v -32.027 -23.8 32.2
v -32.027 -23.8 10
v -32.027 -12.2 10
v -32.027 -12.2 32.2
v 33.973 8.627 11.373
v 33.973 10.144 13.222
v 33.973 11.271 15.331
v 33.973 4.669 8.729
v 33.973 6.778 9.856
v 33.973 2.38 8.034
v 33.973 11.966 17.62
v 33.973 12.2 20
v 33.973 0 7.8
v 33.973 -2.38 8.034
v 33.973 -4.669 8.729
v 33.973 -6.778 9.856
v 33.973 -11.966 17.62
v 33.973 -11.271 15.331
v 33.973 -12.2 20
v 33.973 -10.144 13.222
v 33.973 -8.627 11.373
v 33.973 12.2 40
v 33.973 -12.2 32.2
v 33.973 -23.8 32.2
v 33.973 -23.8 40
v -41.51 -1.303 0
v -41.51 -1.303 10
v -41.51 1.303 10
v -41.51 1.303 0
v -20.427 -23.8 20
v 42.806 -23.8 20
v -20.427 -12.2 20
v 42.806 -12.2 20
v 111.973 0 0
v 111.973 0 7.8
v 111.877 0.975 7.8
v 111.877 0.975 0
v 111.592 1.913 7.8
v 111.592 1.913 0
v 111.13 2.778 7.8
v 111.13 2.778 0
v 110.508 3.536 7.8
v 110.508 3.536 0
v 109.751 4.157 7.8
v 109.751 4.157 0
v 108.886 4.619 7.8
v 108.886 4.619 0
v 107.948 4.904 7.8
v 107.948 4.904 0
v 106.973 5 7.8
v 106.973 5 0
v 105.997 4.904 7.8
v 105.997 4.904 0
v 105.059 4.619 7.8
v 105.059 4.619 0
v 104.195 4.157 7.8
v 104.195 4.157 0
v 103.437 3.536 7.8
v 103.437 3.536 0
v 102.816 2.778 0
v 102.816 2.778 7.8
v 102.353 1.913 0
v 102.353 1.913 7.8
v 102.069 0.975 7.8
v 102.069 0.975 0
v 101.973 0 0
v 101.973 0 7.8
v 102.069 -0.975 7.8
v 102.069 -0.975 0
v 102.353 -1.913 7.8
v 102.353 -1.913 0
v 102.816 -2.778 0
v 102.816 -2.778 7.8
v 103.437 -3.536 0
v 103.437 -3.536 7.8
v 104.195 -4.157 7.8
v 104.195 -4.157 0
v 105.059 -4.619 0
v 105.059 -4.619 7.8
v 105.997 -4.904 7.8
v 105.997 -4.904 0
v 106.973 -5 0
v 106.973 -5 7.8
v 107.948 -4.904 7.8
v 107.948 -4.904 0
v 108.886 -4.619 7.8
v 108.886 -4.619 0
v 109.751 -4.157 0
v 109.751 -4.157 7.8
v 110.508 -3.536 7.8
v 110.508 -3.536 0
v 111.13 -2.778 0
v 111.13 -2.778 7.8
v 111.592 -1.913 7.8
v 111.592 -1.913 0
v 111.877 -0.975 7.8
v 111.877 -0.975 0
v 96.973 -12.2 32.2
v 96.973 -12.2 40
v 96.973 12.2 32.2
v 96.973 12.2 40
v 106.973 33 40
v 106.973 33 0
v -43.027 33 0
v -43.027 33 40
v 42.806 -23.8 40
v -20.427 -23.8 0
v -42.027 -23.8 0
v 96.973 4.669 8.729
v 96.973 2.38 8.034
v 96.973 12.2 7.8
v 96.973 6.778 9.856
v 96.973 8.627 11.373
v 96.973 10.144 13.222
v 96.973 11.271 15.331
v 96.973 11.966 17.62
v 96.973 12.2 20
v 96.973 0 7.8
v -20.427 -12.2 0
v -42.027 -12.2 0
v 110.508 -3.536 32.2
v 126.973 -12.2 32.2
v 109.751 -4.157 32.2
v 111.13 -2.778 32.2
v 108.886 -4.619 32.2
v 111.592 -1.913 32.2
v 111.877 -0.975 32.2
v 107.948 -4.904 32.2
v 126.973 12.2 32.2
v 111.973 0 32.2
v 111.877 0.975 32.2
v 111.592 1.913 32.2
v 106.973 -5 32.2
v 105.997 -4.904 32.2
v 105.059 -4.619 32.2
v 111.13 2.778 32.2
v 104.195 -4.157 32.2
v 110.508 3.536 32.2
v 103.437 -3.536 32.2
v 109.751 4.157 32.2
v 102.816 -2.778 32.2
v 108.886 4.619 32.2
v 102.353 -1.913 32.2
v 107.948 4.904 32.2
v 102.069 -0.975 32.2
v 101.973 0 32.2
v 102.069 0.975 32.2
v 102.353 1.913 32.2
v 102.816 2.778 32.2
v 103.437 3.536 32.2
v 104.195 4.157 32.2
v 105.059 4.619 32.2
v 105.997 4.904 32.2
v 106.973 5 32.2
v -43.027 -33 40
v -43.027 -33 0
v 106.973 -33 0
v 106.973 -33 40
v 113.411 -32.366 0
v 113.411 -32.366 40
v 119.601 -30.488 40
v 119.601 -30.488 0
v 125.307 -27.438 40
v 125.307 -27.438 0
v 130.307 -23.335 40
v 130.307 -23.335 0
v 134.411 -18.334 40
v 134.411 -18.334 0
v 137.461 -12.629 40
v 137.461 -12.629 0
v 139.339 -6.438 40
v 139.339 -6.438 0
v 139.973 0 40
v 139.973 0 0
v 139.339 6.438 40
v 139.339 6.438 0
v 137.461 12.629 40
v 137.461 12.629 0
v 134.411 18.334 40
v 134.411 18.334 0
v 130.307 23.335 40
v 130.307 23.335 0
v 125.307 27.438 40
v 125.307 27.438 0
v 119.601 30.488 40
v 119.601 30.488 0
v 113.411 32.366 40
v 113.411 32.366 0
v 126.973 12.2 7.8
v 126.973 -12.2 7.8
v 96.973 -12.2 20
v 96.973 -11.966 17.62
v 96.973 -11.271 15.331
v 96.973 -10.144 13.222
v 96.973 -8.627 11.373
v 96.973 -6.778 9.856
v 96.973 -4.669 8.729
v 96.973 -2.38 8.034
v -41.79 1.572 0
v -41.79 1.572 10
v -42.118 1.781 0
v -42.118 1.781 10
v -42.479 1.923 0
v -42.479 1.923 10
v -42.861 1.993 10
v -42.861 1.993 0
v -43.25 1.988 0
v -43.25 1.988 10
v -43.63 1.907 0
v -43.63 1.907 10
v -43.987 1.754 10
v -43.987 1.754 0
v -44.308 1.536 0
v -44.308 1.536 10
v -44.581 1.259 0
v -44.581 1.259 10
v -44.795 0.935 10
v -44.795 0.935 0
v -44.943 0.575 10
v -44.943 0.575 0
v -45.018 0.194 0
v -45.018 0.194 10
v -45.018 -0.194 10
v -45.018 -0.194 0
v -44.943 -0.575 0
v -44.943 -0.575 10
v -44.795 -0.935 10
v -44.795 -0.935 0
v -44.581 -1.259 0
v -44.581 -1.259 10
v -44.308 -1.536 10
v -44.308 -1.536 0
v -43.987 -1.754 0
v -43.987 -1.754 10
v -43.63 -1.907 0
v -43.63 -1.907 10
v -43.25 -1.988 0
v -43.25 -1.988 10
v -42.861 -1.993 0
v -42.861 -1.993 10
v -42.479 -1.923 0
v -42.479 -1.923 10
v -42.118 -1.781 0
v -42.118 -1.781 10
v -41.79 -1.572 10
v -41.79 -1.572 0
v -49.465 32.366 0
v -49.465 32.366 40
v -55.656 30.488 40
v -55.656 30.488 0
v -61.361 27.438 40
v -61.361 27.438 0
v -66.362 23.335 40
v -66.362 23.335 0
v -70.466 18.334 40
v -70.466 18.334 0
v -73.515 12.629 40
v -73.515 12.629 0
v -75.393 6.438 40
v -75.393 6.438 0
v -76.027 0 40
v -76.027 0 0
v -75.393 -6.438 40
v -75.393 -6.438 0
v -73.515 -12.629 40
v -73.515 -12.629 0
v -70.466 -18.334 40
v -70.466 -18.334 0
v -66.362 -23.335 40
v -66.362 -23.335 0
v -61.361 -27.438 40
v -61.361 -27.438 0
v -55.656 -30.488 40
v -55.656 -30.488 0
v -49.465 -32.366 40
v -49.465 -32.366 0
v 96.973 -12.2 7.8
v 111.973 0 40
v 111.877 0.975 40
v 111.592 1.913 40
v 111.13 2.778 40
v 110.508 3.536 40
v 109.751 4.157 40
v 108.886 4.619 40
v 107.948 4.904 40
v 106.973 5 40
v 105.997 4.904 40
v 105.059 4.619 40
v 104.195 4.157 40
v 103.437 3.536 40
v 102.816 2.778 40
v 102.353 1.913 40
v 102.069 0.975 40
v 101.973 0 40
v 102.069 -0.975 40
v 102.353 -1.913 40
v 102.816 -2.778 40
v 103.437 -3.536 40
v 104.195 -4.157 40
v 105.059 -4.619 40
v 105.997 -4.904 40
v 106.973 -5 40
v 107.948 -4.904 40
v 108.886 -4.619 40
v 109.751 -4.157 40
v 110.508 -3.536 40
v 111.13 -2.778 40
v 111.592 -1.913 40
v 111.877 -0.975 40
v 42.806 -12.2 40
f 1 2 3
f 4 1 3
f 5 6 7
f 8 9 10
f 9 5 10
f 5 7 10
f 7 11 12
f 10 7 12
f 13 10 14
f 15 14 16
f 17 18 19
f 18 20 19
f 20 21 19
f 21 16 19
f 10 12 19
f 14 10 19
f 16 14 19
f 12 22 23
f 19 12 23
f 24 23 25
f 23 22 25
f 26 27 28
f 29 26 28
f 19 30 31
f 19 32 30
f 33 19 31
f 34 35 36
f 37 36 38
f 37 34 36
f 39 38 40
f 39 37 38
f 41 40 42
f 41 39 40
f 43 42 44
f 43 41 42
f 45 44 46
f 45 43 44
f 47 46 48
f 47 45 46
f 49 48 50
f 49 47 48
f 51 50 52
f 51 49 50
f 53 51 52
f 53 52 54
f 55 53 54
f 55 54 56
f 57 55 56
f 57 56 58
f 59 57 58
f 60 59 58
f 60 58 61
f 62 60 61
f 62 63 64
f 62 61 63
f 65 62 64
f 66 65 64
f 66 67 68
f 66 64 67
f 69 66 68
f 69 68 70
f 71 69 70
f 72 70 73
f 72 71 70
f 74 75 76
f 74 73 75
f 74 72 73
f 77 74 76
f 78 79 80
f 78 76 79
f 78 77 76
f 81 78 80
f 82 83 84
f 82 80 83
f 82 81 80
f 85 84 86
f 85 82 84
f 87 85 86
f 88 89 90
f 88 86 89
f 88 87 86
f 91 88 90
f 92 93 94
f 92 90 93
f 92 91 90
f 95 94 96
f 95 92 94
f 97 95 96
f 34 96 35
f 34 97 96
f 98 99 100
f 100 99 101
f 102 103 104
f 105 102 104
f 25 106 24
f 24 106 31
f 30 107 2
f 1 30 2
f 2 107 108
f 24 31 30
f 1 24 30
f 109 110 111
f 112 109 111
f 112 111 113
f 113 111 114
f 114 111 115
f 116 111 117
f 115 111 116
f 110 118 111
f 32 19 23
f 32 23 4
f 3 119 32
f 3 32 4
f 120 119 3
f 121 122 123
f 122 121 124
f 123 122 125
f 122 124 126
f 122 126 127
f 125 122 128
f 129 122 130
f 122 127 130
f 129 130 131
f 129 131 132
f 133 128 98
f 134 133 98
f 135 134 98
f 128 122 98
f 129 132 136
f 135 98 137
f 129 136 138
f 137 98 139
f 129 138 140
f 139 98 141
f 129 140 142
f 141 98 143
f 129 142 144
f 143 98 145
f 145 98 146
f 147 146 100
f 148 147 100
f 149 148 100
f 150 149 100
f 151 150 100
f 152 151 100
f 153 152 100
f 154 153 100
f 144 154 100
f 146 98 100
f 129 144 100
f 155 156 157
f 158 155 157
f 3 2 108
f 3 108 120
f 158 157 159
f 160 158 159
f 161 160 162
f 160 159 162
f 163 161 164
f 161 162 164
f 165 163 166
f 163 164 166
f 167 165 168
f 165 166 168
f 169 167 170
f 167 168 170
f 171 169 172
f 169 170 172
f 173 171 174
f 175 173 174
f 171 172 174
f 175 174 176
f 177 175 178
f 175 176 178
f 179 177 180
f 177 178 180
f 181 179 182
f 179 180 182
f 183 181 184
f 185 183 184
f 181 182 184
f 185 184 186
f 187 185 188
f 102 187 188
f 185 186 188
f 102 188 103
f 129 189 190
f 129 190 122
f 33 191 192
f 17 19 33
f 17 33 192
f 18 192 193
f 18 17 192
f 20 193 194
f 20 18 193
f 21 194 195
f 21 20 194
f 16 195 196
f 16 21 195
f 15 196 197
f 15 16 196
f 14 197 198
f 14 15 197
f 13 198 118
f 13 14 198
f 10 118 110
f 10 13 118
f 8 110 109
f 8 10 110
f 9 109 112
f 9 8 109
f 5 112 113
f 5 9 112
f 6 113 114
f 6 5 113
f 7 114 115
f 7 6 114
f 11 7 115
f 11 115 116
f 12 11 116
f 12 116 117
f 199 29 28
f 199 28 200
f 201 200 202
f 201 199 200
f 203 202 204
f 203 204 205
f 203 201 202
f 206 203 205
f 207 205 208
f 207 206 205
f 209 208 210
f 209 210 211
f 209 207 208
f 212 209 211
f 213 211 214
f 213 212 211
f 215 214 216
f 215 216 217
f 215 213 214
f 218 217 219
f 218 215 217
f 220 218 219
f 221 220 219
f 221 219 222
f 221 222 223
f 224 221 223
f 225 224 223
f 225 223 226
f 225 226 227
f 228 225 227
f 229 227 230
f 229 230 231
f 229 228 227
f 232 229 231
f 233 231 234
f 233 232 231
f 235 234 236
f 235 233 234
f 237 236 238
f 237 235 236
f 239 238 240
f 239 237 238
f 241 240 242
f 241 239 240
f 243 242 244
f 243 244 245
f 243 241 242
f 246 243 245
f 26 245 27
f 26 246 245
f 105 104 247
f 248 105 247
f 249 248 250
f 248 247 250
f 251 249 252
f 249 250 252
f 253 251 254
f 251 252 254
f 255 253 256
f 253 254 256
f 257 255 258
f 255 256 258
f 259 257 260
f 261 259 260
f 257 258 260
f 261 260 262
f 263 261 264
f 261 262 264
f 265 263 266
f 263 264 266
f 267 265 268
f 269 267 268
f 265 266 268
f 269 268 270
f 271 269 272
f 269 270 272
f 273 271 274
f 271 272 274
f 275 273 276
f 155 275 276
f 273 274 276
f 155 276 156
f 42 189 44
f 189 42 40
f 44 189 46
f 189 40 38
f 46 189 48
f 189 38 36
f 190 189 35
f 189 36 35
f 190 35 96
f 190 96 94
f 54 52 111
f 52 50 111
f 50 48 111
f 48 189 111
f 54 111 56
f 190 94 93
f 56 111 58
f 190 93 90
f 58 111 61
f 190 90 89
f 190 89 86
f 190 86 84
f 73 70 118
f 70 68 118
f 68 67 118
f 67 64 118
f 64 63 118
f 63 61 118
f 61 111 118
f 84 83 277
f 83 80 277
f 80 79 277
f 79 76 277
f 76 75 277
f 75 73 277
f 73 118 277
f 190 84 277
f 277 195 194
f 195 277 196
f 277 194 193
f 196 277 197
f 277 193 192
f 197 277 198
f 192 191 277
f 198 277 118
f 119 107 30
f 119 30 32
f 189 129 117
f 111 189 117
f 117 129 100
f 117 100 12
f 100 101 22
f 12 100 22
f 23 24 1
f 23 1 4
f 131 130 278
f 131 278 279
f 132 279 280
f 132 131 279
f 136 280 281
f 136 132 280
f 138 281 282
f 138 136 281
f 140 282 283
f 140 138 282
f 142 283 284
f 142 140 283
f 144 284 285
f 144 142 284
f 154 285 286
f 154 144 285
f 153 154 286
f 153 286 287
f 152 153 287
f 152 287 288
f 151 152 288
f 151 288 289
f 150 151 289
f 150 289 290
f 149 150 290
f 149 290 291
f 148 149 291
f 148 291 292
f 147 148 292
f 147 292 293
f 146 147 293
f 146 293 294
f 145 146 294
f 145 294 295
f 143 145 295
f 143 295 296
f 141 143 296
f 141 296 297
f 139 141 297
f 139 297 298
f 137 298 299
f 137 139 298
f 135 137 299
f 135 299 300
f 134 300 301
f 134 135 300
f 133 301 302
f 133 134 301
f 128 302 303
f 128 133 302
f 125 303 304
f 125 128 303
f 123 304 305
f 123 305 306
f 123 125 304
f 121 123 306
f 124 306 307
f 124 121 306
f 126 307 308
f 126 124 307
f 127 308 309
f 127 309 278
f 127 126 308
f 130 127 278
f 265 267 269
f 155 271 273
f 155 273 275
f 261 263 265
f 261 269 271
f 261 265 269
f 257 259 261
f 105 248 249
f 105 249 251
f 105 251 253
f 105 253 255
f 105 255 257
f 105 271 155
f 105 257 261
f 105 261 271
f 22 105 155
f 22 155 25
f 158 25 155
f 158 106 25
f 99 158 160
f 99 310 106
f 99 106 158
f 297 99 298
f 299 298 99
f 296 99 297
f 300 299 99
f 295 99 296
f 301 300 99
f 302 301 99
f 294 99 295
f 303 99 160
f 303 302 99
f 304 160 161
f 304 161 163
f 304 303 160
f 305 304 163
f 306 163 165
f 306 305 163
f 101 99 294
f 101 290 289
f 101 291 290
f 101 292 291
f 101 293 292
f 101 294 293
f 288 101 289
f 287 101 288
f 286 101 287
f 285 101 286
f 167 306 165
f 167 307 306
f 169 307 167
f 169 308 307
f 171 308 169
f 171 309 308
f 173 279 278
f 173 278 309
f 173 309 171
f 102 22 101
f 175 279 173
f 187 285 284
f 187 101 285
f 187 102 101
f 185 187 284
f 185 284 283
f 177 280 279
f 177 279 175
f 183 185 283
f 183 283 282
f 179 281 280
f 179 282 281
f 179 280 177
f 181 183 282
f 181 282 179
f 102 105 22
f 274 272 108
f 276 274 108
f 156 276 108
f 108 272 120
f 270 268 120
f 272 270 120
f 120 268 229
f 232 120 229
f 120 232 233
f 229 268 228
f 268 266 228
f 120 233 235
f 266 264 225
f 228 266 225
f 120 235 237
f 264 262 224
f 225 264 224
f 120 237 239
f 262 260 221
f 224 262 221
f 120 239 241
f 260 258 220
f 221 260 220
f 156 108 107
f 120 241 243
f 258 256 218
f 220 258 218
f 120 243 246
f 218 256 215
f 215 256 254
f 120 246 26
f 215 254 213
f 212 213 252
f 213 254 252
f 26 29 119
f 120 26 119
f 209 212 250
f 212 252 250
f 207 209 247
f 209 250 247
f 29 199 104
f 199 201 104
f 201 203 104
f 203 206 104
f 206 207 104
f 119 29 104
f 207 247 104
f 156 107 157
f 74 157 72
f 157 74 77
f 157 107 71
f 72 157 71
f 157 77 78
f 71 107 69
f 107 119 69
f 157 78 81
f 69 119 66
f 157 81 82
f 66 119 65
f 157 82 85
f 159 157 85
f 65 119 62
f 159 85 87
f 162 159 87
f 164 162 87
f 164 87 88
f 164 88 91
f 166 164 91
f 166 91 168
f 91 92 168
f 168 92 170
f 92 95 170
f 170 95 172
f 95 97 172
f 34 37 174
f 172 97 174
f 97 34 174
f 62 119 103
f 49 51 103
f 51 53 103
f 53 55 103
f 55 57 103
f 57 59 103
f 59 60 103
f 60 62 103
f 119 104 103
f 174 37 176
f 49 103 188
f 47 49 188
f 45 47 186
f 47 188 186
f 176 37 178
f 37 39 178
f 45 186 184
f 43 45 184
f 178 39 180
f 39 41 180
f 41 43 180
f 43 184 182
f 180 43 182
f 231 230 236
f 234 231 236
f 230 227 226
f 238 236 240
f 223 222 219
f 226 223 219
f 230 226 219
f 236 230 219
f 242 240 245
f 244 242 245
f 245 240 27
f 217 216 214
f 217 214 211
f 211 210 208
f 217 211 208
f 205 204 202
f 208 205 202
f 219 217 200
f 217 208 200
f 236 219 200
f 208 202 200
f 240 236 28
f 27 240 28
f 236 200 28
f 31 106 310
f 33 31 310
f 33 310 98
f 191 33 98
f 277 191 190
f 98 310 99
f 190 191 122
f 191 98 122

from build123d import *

# Parameters (mm, degrees)
CROQUIS1_R              = 5
SALIENTE_EXTRUIR1_DEPTH = 40
CORTAR_EXTRUIR2_DEPTH   = 10
CORTAR_EXTRUIR4_DEPTH   = 20
CROQUIS6_R              = 12.2
CORTAR_EXTRUIR6_DEPTH   = 63
CORTAR_EXTRUIR9_DEPTH   = 30
CROQUIS8_W              = 12.2
CROQUIS8_H              = 11.6
CORTAR_EXTRUIR10_DEPTH  = 66
CORTAR_EXTRUIR11_REACH  = 151.27
CROQUIS9_W              = 11.6
CROQUIS9_H              = 11.6
CHAFL_N1_SIZE           = 10


with BuildPart() as part:
    # Croquis1 → Saliente-Extruir1 (new body)
    with BuildSketch(Plane.XY):
        with BuildLine():
            Line((106.972889038, 33), (-43.027110962, 33))
            ThreePointArc((-43.027110962, 33), (-76.027110962, 0), (-43.027110962, -33))
            Line((-43.027110962, -33), (106.972889038, -33))
            ThreePointArc((106.972889038, -33), (139.972889038, 0), (106.972889038, 33))
        make_face()
        with Locations((106.972889038, 0)):
            Circle(CROQUIS1_R, mode=Mode.SUBTRACT)
    extrude(amount=SALIENTE_EXTRUIR1_DEPTH)

    # Croquis1<4> → Cortar-Extruir2 (cut)
    with BuildSketch(Plane.XY):
        with BuildLine():
            Line((-41.509889959, -1.303088803), (-41.509889959, 1.303088803))
            ThreePointArc((-41.509889959, 1.303088803), (-45.027110962, 0), (-41.509889959, -1.303088803))
        make_face()
    extrude(amount=CORTAR_EXTRUIR2_DEPTH, mode=Mode.SUBTRACT)

    # Croquis5 → Cortar-Extruir4 (cut)
    with BuildSketch(Plane.XY.offset(40)):
        Polygon((96.972889038, -12.2), (96.972889038, 12.2), (33.972889038, 12.2), (33.972889038, -23.8), (42.805927542, -23.8), (42.805927542, -12.2), align=None)
    extrude(amount=-CORTAR_EXTRUIR4_DEPTH, mode=Mode.SUBTRACT)

    # Croquis6 → Cortar-Extruir6 (cut)
    with BuildSketch(Plane(origin=(33.972889038, 0, 0), x_dir=(0, 0, -1), z_dir=(1, 0, 0))):
        with Locations((-20, 0)):
            Circle(CROQUIS6_R)
        with BuildLine():
            ThreePointArc((-20, -12.2), (-32.2, 0), (-20, 12.2))
            Line((-20, 12.2), (-40, 12.2))
            Line((-40, 12.2), (-40, -12.2))
            Line((-40, -12.2), (-20, -12.2))
        make_face()
    extrude(amount=CORTAR_EXTRUIR6_DEPTH, mode=Mode.SUBTRACT)

    # Croquis7 → Cortar-Extruir9 (cut)
    with BuildSketch(Plane.ZY.offset(-96.972889038)):
        with BuildLine():
            ThreePointArc((7.8, -3.1e-08), (11.37329728, -8.626702741), (20, -12.2))
            Line((20, -12.2), (32.2, -12.2))
            Line((32.2, -12.2), (32.2, 12.2))
            Line((32.2, 12.2), (20, 12.2))
            ThreePointArc((20, 12.2), (11.373297259, 8.62670272), (7.8, -3.1e-08))
        make_face()
        with BuildLine():
            Line((7.8, -12.2), (20, -12.2))
            ThreePointArc((20, -12.2), (11.37329728, -8.626702741), (7.8, -3.1e-08))
            Line((7.8, -3.1e-08), (7.8, -12.2))
        make_face()
        with BuildLine():
            Line((7.8, 12.2), (7.8, -3.1e-08))
            ThreePointArc((7.8, -3.1e-08), (11.373297259, 8.62670272), (20, 12.2))
            Line((20, 12.2), (7.8, 12.2))
        make_face()
    extrude(amount=-CORTAR_EXTRUIR9_DEPTH, mode=Mode.SUBTRACT)

    # Croquis8 → Cortar-Extruir10 (cut)
    with BuildSketch(Plane(origin=(33.972889038, 0, 0), x_dir=(0, 0, -1), z_dir=(1, 0, 0))):
        with Locations((-26.1, -18)):
            Rectangle(CROQUIS8_W, CROQUIS8_H)
    extrude(amount=-CORTAR_EXTRUIR10_DEPTH, mode=Mode.SUBTRACT)

    # Croquis9 → Cortar-Extruir11 (cut, up to next)
    with BuildSketch(Plane(origin=(0, 0, 0), x_dir=(-1, 0, 0), z_dir=(0, 0, -1)), mode=Mode.PRIVATE) as cortar_extruir11_sk1:
        with Locations((26.227110962, -18)):
            Rectangle(CROQUIS9_W, CROQUIS9_H)
    cortar_extruir11_tool1 = extrude(cortar_extruir11_sk1.sketch, amount=-CORTAR_EXTRUIR11_REACH, mode=Mode.PRIVATE) & part.part
    add(cortar_extruir11_tool1.solids().sort_by_distance((-26.227111, -18, 0))[0], mode=Mode.SUBTRACT)

    # Chaflán1
    chafl_n1_edges = [part.edges().sort_by_distance(p)[0] for p in [
        (-32.027110962, -18, 0),
    ]]
    chamfer(chafl_n1_edges, length=CHAFL_N1_SIZE)


solid = part.part
